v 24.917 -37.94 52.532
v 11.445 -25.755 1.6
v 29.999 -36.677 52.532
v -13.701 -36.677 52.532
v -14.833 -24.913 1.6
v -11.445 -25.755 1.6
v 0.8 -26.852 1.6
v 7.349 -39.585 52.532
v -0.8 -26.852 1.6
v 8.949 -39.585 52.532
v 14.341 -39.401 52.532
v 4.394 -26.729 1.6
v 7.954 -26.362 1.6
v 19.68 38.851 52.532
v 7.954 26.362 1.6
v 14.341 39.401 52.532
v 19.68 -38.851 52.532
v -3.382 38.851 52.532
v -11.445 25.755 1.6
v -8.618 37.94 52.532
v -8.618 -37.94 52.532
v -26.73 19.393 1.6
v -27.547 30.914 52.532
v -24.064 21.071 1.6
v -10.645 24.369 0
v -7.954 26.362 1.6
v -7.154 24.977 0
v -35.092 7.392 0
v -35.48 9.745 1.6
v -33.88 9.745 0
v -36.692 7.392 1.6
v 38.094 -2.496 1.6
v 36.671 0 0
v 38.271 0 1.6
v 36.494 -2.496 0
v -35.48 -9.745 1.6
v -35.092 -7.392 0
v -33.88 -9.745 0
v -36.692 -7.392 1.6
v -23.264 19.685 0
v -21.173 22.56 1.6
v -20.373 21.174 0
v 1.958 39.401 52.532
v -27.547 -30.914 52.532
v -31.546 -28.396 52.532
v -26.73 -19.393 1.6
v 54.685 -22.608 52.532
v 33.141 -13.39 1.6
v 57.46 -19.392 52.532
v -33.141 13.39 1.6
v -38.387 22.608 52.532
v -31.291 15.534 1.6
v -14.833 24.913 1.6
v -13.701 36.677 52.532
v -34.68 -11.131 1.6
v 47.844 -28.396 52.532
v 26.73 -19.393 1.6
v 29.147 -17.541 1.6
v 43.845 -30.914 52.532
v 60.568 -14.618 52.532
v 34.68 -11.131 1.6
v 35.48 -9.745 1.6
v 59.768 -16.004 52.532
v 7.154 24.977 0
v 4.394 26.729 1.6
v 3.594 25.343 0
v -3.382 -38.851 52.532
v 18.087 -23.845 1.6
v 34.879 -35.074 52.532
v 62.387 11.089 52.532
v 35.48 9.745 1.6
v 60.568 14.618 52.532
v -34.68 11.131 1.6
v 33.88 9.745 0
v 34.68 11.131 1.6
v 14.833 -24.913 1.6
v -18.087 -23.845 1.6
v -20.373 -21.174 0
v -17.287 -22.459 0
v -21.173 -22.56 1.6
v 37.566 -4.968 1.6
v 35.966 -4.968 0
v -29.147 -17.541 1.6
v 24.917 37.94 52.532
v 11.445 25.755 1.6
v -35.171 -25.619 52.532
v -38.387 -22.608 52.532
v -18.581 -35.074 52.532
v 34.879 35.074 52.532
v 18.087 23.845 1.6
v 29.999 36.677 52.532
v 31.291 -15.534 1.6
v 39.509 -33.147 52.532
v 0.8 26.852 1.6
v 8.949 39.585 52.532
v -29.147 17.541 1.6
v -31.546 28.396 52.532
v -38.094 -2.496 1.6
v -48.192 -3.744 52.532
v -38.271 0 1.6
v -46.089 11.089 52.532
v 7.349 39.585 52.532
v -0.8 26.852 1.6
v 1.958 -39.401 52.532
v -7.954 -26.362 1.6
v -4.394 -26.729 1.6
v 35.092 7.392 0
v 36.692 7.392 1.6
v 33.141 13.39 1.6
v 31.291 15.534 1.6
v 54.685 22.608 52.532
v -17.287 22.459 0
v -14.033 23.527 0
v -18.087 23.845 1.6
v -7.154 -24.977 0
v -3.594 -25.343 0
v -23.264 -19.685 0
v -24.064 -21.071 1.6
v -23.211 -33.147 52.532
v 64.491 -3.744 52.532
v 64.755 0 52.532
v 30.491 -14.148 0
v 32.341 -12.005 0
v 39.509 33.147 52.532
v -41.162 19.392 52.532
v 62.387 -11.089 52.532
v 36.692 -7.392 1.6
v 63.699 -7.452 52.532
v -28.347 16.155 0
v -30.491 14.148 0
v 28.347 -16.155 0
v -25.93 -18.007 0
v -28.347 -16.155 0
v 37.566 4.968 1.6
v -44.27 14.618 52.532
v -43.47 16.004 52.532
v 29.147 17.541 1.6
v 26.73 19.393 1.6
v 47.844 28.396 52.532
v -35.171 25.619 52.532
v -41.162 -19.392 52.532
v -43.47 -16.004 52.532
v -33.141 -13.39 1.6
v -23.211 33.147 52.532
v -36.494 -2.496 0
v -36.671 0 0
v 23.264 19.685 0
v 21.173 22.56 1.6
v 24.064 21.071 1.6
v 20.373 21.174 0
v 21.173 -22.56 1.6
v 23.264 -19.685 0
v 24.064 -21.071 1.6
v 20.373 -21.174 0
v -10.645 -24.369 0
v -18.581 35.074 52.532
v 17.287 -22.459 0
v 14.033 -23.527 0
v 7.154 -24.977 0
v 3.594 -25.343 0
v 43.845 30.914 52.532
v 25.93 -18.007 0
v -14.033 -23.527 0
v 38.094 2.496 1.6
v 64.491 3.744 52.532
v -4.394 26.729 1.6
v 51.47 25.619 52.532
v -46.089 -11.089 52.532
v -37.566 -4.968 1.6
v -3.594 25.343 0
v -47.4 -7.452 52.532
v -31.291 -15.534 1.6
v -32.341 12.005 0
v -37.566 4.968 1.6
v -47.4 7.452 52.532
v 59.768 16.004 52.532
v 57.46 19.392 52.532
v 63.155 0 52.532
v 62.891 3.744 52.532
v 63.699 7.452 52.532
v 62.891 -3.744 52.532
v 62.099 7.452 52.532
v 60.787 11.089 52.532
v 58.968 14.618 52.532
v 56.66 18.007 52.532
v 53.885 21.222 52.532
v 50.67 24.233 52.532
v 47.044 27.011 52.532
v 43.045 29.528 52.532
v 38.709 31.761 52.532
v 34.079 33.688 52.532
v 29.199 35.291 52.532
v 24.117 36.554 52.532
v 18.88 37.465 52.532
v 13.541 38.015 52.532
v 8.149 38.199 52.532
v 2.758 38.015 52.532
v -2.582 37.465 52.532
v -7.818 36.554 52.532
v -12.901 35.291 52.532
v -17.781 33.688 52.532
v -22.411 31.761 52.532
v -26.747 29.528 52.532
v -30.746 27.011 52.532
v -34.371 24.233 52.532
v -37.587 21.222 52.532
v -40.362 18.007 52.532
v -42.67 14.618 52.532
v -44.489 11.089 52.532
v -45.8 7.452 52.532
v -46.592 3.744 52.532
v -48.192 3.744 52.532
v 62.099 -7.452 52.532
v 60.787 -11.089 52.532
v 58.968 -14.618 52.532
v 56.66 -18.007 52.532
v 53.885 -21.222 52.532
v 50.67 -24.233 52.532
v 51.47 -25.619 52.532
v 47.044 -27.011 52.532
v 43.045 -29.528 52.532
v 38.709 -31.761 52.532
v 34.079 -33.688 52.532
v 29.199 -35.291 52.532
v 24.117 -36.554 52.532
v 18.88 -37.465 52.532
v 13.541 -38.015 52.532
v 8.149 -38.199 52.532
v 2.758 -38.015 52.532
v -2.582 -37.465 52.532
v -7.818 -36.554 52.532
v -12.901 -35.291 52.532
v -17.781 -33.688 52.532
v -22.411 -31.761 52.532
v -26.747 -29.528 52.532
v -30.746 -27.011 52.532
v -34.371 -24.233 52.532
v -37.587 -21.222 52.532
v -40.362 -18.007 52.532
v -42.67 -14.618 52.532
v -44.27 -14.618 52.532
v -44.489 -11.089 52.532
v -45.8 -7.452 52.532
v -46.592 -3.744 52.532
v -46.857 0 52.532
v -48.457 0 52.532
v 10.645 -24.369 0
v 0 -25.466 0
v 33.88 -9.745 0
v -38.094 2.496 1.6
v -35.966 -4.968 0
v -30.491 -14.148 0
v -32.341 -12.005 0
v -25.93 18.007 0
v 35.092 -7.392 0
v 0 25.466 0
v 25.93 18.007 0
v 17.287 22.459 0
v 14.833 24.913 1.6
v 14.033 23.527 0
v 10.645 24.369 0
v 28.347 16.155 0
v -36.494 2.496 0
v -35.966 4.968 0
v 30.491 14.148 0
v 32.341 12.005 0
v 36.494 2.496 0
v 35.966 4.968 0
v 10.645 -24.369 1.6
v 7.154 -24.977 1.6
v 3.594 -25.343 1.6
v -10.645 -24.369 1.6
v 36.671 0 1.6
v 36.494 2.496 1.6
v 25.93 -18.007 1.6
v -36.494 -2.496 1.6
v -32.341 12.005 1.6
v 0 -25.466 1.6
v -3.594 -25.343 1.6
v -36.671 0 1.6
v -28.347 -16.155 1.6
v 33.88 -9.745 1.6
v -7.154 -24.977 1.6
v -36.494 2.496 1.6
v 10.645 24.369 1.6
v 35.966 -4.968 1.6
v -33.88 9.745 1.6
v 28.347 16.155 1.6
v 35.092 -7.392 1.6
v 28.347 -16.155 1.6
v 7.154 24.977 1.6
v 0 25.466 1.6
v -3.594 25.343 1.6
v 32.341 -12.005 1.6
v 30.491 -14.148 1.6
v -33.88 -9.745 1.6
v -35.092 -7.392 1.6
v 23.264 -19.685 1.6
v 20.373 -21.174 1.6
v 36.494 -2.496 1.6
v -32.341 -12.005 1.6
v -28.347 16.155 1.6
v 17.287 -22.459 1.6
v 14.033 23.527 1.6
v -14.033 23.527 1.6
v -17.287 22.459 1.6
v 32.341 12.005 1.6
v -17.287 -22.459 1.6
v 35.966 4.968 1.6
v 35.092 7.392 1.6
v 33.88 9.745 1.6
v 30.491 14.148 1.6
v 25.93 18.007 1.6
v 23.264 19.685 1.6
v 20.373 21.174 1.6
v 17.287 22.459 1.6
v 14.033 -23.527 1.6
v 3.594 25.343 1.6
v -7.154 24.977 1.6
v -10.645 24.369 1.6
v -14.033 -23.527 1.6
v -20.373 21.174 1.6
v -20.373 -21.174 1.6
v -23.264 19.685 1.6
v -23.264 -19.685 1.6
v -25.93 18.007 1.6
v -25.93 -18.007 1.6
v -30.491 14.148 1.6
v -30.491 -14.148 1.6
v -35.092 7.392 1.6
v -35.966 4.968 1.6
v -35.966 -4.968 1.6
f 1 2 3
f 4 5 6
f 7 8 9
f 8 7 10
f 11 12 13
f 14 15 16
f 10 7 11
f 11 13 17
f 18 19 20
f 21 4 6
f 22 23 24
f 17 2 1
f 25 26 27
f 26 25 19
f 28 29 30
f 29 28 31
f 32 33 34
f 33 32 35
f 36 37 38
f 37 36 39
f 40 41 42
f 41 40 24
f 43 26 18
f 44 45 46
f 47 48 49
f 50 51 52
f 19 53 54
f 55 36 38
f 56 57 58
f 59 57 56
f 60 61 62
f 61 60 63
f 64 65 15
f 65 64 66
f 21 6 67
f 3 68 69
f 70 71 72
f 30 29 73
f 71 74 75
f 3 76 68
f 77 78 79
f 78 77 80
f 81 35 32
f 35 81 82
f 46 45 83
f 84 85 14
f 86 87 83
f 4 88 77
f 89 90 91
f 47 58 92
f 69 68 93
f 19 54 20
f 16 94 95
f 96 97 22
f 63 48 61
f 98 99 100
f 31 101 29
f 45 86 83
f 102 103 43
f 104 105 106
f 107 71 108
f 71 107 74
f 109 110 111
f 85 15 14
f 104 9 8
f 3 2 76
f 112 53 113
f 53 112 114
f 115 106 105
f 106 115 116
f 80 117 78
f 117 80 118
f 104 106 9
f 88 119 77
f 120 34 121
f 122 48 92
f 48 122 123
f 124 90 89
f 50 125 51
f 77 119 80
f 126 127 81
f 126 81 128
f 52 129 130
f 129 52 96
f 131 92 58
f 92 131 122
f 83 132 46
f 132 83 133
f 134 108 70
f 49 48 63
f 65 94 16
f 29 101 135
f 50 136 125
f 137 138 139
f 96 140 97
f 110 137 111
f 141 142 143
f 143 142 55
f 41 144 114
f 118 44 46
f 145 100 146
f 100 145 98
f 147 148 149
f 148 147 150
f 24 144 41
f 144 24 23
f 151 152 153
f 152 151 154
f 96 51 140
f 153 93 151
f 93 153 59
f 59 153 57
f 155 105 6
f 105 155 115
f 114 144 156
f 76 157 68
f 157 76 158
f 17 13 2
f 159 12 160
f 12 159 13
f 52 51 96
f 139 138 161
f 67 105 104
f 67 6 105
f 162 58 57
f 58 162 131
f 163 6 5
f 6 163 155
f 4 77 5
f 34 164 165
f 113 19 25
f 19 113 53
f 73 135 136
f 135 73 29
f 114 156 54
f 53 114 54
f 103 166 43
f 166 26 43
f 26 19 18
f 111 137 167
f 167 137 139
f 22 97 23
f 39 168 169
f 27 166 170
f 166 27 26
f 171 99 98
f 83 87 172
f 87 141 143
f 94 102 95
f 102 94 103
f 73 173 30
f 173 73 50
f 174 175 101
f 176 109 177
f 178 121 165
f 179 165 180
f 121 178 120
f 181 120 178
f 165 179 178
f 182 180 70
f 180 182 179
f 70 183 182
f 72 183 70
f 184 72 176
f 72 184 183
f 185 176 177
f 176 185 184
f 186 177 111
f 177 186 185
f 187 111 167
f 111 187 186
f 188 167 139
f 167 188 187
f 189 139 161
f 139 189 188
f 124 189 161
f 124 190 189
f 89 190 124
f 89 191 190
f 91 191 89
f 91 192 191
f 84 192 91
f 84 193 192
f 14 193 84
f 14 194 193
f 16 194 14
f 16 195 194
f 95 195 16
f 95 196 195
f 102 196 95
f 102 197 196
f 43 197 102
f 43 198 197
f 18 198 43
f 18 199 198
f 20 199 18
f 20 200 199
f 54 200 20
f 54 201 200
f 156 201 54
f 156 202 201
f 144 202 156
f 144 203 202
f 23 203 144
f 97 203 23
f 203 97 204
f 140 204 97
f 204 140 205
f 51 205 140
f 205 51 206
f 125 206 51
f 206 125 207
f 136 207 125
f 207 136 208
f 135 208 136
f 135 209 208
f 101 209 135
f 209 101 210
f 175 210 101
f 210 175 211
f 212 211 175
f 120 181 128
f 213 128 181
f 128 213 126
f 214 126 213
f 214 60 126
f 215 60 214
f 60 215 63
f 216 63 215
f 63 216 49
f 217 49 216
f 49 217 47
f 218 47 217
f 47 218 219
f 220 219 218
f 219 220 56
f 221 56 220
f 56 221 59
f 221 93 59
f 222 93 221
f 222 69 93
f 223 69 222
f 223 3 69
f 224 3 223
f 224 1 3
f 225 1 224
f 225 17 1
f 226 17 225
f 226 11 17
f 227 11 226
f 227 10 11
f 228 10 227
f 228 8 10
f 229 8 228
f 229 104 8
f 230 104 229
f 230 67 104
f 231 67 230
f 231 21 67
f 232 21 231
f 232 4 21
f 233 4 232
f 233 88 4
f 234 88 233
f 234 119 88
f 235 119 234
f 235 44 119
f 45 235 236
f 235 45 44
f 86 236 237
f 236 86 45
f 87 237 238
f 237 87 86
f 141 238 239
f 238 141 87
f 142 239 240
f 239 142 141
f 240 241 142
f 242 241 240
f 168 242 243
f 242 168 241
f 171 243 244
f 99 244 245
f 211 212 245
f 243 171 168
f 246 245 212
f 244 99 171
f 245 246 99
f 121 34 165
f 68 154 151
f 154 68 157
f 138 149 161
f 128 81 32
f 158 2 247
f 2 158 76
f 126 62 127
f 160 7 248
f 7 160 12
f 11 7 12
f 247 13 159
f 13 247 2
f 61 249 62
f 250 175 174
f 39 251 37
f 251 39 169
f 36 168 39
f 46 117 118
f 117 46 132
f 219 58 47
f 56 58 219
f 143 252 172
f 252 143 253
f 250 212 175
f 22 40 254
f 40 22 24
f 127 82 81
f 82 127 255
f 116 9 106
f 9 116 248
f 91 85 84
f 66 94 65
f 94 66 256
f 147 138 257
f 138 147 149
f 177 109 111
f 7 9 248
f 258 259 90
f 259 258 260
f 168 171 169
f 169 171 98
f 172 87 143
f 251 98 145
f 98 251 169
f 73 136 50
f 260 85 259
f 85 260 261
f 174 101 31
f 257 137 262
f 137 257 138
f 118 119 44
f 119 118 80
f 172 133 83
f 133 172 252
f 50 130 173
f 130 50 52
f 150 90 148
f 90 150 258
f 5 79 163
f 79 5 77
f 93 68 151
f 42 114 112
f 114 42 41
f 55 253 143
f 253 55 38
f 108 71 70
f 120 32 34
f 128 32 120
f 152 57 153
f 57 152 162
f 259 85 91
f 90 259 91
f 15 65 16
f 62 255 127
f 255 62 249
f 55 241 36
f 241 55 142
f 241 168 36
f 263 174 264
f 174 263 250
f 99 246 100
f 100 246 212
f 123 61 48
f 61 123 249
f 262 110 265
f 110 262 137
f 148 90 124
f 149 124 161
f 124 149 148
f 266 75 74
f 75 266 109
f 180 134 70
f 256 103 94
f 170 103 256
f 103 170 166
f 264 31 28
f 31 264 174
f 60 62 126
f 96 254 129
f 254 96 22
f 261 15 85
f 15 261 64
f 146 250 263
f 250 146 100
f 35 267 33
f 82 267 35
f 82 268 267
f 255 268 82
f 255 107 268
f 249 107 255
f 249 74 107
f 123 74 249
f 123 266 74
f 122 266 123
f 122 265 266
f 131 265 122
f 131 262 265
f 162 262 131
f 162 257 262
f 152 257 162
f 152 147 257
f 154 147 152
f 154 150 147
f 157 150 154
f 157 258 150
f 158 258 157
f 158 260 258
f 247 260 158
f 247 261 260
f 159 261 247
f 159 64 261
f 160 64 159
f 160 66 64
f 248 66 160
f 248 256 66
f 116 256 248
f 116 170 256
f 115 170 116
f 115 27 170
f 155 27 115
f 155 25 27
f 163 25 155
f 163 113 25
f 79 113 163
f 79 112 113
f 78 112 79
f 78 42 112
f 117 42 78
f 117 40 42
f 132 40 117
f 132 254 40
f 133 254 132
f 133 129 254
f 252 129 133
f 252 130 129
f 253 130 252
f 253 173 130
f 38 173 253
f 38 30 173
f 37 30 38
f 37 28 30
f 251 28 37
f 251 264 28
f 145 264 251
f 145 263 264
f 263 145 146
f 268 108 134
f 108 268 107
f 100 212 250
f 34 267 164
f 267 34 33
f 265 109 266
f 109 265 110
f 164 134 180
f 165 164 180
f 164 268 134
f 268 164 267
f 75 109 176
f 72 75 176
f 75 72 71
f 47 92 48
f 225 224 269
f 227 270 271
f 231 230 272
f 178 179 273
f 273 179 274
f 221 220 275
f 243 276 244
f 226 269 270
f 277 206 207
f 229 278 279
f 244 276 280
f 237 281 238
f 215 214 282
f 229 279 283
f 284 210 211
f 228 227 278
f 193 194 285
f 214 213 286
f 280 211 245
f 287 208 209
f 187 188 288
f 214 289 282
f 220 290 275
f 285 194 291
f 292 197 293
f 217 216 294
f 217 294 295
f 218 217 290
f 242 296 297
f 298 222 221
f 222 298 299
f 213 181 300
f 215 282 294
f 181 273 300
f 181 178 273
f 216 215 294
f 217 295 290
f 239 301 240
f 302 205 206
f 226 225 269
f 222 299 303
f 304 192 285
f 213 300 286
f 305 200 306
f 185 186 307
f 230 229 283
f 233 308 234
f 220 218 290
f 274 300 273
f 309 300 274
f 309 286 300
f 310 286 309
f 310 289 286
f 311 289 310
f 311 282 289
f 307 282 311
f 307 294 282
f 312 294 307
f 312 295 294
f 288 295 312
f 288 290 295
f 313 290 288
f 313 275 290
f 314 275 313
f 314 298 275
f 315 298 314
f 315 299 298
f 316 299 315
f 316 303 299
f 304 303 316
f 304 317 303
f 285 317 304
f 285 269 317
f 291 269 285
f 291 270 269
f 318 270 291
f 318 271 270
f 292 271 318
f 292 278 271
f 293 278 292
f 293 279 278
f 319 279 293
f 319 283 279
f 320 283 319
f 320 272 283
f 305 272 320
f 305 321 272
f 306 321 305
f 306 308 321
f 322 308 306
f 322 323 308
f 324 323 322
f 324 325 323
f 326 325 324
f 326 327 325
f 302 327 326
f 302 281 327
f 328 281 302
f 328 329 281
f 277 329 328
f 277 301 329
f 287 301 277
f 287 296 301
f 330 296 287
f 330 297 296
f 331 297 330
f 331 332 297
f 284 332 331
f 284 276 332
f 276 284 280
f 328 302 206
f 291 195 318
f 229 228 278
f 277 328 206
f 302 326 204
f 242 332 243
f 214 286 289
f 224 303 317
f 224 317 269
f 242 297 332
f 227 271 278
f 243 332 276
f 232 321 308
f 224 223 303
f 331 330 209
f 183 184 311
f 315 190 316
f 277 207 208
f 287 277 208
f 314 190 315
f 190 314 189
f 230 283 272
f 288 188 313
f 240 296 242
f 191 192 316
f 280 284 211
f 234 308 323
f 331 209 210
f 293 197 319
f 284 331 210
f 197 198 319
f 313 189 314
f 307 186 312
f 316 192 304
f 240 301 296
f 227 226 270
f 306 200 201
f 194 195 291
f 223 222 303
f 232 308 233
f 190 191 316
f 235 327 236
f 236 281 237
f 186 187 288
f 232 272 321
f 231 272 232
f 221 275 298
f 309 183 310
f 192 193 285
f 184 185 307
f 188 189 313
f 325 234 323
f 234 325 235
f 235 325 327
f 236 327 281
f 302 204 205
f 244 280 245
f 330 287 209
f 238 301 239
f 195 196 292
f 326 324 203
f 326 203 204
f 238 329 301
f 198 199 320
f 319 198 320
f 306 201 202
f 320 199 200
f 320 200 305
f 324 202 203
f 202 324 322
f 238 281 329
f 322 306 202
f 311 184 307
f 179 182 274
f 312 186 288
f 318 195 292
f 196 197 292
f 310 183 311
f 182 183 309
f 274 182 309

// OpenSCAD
// [FL_INDEX: keywords="openscad, 3d_parametric, Parametric_Measuring_Cup, csg_solid" | COT="Parametric OpenSCAD design from 3DCodeverse"]
// Title: Parametric Measuring Cup

//Code by Griffin Nicoll 2012

//Stuff to edit! volume is summed so only add what you want
cups = 1;
tbsp = 0;
tsp = 0;
mL = 0;
wall = 1.6; //wall thickness

//stuff you don't need to edit
sq = 1.2; //squeeze
sh = 0.16; //shear
pi = 3.14159;
volume = cups*236588+tbsp*14787+tsp*4929+1000*mL;//mm^3

difference(){
	minkowski(){
		cylinder(r1=0,r2=wall,h=wall,$fn=6);
		cupBase(volume);
	}
	translate([0,0,wall])cupBase(volume);
}
module cupBase(volume){
	x = pow(volume/(570*pi),1/3);
	multmatrix(m=[
		[sq, 0, sh, 0],
		[0, 1/sq, 0, 0],
		[0, 0, 1, 0],
		[0, 0, 0,  1]])
	cylinder(h=10*x,r1=6*x,r2=9*x,$fn=64);
}
